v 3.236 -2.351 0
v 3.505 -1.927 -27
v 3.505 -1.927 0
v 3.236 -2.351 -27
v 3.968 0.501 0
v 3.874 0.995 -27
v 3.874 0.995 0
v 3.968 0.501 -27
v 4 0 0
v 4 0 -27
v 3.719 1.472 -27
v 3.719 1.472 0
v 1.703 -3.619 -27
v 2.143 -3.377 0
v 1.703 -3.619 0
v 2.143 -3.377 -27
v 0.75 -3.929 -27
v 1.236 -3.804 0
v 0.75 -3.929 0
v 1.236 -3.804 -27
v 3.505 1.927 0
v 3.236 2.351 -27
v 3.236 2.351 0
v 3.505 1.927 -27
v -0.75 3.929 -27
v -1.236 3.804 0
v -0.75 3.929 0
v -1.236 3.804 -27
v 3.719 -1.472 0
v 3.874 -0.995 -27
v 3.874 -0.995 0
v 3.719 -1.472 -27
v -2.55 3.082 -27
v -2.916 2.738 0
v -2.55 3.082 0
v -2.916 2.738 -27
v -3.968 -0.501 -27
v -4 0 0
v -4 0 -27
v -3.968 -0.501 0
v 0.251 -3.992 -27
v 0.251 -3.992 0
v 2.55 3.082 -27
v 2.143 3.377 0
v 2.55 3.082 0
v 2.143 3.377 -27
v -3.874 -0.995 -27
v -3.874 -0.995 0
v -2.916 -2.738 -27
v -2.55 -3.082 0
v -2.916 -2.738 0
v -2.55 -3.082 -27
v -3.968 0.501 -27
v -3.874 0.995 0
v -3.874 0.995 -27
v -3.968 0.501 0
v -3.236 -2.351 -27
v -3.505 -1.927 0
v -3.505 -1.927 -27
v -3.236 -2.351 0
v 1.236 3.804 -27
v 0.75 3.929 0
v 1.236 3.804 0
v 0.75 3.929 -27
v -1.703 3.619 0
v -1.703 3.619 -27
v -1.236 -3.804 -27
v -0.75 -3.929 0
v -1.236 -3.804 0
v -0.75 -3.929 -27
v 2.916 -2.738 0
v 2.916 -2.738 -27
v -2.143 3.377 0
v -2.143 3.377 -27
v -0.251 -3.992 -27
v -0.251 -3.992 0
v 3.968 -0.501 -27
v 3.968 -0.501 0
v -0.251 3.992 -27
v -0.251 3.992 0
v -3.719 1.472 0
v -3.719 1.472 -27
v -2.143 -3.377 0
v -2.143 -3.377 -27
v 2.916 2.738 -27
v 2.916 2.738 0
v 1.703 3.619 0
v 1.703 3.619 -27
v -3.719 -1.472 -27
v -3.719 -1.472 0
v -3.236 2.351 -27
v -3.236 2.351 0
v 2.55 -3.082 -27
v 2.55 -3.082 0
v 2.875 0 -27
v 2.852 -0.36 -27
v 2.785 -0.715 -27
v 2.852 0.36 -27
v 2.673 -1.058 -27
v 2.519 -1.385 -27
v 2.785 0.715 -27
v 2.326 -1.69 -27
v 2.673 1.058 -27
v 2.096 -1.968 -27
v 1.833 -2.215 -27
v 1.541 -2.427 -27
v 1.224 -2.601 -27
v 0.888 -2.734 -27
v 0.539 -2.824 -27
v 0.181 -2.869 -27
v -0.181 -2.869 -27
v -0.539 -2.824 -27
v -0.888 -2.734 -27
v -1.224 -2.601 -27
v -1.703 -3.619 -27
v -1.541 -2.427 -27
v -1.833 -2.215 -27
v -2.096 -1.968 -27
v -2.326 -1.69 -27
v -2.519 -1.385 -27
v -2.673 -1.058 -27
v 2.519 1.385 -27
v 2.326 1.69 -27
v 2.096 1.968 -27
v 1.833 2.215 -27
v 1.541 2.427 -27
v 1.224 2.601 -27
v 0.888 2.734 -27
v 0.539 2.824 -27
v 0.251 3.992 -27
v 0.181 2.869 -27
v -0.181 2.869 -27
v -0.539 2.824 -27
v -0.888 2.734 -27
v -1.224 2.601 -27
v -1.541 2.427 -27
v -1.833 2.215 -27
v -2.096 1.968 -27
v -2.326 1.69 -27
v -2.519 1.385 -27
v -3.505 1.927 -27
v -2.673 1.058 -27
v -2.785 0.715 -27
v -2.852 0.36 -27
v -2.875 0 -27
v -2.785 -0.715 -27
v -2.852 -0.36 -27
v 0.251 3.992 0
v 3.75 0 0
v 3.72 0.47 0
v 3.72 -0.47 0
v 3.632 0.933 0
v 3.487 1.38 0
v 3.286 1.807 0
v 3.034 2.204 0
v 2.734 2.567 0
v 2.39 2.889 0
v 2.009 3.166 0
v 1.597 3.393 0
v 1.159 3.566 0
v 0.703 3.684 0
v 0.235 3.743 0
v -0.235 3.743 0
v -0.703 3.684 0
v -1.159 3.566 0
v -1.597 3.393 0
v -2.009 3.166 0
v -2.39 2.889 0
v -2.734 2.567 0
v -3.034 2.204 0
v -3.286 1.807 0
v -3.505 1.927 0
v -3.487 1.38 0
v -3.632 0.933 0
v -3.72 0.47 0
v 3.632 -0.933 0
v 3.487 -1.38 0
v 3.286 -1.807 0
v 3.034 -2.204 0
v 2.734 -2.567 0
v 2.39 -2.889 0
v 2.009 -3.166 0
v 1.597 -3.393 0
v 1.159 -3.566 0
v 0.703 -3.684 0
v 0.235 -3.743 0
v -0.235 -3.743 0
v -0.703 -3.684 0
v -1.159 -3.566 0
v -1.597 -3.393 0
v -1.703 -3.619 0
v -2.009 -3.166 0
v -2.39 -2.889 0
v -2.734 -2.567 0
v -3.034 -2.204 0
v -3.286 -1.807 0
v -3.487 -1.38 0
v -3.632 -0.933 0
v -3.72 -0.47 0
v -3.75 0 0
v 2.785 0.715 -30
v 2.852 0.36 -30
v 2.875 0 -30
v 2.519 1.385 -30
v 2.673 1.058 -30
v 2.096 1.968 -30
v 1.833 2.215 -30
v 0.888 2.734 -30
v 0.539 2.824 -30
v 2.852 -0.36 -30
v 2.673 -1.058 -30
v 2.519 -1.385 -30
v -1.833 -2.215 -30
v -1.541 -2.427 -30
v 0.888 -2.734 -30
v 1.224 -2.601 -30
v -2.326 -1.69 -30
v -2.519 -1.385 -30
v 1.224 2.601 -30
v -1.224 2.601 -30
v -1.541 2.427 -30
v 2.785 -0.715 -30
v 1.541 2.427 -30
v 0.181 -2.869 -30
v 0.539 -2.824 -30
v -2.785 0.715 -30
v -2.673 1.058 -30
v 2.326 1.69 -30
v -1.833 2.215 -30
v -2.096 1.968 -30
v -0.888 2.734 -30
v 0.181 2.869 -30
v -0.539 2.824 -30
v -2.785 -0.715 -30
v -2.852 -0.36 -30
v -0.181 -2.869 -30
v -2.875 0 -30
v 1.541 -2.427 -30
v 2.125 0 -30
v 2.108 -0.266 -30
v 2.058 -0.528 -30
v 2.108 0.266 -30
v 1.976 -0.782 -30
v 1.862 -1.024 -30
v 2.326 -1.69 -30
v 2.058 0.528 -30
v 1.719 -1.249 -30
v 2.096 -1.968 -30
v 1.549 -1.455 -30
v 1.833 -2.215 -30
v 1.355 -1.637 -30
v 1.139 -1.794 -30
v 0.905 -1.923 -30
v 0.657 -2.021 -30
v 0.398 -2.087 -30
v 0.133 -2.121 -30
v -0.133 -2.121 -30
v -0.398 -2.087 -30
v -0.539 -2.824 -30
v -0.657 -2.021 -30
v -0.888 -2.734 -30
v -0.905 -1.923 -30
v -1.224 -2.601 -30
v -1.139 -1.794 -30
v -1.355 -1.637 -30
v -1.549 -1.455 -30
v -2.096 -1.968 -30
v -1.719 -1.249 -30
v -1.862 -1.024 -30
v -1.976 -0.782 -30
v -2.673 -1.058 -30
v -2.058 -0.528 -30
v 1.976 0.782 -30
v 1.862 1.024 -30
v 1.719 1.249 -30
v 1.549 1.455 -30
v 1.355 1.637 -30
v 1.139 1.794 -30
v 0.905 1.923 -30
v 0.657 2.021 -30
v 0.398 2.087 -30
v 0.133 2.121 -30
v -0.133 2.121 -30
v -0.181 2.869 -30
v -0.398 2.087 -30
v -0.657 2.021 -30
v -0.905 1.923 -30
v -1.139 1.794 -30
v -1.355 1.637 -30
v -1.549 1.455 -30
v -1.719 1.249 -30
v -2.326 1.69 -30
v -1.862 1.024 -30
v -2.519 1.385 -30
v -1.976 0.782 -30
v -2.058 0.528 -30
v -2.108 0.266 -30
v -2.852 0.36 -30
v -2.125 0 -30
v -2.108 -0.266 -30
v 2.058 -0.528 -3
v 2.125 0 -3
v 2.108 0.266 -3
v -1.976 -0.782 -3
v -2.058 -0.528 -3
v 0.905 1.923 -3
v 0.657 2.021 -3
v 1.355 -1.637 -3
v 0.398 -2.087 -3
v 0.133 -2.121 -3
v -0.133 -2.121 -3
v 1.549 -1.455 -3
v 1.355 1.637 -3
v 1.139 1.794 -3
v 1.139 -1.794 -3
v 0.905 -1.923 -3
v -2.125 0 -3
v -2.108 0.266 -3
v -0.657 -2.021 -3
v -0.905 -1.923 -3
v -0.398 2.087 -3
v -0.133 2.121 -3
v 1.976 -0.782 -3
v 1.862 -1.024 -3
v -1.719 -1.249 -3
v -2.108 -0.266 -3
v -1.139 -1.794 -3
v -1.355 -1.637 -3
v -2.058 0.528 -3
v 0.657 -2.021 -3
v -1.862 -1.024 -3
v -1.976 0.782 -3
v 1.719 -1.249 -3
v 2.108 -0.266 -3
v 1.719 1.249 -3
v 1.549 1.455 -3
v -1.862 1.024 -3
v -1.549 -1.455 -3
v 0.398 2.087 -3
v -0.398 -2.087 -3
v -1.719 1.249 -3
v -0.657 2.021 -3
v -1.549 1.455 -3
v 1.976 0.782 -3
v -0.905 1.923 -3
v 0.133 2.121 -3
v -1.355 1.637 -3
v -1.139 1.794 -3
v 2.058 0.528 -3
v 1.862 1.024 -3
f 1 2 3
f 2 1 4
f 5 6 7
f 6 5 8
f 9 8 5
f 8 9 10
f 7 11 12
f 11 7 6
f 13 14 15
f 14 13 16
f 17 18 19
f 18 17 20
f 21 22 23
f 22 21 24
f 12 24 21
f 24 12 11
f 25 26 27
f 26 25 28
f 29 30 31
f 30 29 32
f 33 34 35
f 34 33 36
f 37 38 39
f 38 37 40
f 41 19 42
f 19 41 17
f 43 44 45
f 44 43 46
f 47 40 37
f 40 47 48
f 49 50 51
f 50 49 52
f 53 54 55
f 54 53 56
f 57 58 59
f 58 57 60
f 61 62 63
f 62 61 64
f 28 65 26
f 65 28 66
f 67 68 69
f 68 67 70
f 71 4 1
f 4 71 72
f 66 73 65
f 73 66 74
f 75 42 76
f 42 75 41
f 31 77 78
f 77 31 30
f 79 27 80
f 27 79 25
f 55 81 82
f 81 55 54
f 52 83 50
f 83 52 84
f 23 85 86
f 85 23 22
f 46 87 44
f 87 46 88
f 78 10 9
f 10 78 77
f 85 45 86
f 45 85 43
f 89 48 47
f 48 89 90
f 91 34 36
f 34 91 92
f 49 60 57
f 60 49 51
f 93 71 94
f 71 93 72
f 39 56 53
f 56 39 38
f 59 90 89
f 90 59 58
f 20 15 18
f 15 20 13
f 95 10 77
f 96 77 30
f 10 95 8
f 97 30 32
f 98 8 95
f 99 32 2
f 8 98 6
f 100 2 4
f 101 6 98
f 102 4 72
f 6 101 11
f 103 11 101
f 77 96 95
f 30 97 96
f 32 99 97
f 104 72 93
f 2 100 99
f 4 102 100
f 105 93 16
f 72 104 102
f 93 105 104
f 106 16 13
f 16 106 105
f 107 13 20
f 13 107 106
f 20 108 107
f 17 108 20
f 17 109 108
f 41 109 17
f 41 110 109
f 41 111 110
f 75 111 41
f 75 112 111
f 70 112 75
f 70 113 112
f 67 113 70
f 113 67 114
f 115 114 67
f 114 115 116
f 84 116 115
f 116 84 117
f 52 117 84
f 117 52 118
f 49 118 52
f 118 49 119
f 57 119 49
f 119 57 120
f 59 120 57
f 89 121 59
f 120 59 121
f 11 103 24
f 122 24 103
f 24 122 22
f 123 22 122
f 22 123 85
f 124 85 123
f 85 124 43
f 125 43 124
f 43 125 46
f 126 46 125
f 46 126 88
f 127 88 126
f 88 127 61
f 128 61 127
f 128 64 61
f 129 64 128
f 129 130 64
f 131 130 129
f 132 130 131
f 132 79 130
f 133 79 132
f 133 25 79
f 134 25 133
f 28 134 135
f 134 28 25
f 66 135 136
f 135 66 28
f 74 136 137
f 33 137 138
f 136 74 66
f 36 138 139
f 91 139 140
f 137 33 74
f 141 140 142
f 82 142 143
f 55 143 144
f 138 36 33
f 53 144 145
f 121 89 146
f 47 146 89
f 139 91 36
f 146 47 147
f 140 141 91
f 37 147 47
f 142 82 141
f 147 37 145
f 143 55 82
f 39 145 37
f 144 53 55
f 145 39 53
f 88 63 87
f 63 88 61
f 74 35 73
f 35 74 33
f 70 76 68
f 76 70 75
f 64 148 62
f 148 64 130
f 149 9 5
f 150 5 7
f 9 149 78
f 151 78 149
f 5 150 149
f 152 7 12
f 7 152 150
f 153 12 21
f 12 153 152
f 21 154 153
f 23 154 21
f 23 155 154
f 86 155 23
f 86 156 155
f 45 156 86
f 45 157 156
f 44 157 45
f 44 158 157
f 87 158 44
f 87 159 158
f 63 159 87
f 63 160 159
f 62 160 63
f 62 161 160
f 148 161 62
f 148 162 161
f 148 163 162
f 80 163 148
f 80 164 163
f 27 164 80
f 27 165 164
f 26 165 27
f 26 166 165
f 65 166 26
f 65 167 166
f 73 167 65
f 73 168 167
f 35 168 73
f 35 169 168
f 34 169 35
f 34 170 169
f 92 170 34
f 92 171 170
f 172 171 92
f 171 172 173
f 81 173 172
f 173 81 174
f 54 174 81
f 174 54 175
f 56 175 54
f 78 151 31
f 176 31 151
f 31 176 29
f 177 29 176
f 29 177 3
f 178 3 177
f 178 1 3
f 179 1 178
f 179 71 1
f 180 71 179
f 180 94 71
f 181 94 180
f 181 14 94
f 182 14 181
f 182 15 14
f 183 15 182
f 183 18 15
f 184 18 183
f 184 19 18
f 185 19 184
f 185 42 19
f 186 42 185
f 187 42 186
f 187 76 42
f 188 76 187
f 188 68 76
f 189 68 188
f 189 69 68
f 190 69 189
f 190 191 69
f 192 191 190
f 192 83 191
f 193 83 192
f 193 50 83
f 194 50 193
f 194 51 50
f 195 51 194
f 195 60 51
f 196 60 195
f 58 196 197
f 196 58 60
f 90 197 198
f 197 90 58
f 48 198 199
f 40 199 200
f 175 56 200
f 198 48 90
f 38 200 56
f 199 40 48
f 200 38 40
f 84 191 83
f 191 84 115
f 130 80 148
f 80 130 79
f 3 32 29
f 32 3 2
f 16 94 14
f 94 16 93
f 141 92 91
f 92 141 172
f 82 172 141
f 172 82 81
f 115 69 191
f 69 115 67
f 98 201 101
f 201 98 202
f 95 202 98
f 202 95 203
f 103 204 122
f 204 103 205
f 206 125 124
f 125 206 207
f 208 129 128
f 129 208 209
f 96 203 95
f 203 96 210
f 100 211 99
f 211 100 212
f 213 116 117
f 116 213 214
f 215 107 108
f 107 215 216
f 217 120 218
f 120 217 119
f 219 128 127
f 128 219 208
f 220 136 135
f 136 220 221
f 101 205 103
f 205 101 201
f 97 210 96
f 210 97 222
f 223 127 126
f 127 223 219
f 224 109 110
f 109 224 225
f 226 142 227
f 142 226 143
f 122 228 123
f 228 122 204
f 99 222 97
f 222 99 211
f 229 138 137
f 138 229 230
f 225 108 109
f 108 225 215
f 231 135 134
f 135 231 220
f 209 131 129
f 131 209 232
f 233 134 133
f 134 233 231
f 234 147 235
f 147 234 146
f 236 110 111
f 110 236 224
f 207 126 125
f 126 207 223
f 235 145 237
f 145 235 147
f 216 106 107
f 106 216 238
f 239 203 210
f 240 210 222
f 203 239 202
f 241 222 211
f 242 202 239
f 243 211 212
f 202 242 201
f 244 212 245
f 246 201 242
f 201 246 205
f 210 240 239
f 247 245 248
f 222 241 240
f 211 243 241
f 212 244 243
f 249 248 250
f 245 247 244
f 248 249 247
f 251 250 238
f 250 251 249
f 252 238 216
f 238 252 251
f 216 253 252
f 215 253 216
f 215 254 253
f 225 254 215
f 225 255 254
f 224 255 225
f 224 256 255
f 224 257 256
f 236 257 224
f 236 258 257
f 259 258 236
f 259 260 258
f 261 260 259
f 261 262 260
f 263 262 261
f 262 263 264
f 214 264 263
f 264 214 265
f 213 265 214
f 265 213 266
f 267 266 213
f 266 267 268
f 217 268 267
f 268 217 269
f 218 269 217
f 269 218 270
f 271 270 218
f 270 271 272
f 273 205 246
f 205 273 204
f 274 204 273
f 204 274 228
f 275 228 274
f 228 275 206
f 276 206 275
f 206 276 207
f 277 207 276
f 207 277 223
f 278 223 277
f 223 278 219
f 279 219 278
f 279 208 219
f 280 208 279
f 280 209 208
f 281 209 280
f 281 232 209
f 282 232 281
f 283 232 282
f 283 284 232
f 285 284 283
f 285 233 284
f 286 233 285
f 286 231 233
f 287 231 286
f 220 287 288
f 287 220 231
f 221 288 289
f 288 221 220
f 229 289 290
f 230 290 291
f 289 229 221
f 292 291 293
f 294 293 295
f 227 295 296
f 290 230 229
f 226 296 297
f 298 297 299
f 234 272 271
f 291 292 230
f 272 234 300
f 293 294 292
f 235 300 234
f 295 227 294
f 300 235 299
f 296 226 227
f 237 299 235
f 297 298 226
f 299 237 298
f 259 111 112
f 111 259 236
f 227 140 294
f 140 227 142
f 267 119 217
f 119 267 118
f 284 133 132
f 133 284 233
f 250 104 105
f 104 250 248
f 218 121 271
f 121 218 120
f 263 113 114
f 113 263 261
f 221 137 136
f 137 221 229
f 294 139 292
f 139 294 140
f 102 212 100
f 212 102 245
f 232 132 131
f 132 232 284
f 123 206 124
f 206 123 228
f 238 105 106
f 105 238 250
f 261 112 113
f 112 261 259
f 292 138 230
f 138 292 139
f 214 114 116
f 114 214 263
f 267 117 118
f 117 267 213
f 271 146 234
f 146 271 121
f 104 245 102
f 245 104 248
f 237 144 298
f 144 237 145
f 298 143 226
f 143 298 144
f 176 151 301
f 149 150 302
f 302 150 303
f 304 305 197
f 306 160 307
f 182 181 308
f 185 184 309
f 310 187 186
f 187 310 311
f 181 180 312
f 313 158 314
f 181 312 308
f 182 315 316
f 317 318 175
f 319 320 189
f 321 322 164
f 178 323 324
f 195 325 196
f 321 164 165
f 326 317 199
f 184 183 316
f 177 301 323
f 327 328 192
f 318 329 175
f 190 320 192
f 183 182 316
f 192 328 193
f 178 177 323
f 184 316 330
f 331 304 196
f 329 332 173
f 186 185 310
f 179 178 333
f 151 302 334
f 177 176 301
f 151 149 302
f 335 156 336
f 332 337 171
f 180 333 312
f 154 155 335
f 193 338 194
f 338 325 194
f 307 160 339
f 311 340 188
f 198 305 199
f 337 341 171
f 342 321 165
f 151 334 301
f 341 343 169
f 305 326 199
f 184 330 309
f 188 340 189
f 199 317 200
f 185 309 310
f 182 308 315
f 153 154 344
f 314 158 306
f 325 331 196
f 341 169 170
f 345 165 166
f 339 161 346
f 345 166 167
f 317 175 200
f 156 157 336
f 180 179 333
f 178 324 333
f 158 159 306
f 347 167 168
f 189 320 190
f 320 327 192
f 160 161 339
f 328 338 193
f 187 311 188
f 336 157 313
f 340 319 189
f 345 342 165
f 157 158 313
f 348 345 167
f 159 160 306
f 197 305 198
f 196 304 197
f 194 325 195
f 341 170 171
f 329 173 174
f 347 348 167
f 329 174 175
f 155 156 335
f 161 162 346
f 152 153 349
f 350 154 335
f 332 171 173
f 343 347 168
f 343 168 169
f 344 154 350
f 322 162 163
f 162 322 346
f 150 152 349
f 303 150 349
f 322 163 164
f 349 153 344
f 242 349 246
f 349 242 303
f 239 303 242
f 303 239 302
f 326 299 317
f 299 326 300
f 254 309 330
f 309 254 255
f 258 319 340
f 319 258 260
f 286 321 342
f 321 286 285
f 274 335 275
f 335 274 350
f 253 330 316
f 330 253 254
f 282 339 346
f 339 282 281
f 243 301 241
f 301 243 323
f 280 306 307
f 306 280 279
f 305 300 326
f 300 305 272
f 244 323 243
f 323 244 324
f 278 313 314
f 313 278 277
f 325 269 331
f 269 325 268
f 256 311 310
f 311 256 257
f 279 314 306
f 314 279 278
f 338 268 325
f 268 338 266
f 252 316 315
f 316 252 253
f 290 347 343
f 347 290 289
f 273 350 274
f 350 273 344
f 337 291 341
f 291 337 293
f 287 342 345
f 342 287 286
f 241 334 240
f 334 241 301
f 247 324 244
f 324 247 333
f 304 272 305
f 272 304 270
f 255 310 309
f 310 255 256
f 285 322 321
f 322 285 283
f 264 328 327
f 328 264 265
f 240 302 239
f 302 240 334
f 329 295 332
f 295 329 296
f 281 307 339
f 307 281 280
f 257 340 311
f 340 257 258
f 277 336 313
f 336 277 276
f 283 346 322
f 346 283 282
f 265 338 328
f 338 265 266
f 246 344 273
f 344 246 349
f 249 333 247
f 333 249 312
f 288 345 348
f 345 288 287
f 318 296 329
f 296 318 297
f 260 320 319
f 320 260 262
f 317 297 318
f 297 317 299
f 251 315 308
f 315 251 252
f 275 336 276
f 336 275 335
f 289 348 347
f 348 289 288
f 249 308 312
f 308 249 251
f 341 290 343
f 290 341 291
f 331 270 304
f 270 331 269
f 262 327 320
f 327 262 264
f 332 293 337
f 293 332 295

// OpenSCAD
$fn = 50;

difference() {
	union() {
		translate(v = [0, 0, -27.0]) {
			cylinder(h = 27, r = 4.0);
		}
		#translate(v = [0, 0, -30.0]) {
			cylinder(h = 30, r = 2.875);
		}
	}
	union() {
		translate(v = [0, 0, 0]) {
			rotate(a = [0, 0, 0]) {
				difference() {
					union() {
						translate(v = [0, 0, -30.0]) {
							cylinder(h = 30, r = 2.0);
						}
						translate(v = [0, 0, -3]) {
							cylinder(h = 3, r1 = 2.125, r2 = 3.75);
						}
						translate(v = [0, 0, -30.0]) {
							cylinder(h = 30, r = 2.125);
						}
						translate(v = [0, 0, -30.0]) {
							cylinder(h = 30, r = 2.0);
						}
					}
					union();
				}
			}
		}
	}
}
